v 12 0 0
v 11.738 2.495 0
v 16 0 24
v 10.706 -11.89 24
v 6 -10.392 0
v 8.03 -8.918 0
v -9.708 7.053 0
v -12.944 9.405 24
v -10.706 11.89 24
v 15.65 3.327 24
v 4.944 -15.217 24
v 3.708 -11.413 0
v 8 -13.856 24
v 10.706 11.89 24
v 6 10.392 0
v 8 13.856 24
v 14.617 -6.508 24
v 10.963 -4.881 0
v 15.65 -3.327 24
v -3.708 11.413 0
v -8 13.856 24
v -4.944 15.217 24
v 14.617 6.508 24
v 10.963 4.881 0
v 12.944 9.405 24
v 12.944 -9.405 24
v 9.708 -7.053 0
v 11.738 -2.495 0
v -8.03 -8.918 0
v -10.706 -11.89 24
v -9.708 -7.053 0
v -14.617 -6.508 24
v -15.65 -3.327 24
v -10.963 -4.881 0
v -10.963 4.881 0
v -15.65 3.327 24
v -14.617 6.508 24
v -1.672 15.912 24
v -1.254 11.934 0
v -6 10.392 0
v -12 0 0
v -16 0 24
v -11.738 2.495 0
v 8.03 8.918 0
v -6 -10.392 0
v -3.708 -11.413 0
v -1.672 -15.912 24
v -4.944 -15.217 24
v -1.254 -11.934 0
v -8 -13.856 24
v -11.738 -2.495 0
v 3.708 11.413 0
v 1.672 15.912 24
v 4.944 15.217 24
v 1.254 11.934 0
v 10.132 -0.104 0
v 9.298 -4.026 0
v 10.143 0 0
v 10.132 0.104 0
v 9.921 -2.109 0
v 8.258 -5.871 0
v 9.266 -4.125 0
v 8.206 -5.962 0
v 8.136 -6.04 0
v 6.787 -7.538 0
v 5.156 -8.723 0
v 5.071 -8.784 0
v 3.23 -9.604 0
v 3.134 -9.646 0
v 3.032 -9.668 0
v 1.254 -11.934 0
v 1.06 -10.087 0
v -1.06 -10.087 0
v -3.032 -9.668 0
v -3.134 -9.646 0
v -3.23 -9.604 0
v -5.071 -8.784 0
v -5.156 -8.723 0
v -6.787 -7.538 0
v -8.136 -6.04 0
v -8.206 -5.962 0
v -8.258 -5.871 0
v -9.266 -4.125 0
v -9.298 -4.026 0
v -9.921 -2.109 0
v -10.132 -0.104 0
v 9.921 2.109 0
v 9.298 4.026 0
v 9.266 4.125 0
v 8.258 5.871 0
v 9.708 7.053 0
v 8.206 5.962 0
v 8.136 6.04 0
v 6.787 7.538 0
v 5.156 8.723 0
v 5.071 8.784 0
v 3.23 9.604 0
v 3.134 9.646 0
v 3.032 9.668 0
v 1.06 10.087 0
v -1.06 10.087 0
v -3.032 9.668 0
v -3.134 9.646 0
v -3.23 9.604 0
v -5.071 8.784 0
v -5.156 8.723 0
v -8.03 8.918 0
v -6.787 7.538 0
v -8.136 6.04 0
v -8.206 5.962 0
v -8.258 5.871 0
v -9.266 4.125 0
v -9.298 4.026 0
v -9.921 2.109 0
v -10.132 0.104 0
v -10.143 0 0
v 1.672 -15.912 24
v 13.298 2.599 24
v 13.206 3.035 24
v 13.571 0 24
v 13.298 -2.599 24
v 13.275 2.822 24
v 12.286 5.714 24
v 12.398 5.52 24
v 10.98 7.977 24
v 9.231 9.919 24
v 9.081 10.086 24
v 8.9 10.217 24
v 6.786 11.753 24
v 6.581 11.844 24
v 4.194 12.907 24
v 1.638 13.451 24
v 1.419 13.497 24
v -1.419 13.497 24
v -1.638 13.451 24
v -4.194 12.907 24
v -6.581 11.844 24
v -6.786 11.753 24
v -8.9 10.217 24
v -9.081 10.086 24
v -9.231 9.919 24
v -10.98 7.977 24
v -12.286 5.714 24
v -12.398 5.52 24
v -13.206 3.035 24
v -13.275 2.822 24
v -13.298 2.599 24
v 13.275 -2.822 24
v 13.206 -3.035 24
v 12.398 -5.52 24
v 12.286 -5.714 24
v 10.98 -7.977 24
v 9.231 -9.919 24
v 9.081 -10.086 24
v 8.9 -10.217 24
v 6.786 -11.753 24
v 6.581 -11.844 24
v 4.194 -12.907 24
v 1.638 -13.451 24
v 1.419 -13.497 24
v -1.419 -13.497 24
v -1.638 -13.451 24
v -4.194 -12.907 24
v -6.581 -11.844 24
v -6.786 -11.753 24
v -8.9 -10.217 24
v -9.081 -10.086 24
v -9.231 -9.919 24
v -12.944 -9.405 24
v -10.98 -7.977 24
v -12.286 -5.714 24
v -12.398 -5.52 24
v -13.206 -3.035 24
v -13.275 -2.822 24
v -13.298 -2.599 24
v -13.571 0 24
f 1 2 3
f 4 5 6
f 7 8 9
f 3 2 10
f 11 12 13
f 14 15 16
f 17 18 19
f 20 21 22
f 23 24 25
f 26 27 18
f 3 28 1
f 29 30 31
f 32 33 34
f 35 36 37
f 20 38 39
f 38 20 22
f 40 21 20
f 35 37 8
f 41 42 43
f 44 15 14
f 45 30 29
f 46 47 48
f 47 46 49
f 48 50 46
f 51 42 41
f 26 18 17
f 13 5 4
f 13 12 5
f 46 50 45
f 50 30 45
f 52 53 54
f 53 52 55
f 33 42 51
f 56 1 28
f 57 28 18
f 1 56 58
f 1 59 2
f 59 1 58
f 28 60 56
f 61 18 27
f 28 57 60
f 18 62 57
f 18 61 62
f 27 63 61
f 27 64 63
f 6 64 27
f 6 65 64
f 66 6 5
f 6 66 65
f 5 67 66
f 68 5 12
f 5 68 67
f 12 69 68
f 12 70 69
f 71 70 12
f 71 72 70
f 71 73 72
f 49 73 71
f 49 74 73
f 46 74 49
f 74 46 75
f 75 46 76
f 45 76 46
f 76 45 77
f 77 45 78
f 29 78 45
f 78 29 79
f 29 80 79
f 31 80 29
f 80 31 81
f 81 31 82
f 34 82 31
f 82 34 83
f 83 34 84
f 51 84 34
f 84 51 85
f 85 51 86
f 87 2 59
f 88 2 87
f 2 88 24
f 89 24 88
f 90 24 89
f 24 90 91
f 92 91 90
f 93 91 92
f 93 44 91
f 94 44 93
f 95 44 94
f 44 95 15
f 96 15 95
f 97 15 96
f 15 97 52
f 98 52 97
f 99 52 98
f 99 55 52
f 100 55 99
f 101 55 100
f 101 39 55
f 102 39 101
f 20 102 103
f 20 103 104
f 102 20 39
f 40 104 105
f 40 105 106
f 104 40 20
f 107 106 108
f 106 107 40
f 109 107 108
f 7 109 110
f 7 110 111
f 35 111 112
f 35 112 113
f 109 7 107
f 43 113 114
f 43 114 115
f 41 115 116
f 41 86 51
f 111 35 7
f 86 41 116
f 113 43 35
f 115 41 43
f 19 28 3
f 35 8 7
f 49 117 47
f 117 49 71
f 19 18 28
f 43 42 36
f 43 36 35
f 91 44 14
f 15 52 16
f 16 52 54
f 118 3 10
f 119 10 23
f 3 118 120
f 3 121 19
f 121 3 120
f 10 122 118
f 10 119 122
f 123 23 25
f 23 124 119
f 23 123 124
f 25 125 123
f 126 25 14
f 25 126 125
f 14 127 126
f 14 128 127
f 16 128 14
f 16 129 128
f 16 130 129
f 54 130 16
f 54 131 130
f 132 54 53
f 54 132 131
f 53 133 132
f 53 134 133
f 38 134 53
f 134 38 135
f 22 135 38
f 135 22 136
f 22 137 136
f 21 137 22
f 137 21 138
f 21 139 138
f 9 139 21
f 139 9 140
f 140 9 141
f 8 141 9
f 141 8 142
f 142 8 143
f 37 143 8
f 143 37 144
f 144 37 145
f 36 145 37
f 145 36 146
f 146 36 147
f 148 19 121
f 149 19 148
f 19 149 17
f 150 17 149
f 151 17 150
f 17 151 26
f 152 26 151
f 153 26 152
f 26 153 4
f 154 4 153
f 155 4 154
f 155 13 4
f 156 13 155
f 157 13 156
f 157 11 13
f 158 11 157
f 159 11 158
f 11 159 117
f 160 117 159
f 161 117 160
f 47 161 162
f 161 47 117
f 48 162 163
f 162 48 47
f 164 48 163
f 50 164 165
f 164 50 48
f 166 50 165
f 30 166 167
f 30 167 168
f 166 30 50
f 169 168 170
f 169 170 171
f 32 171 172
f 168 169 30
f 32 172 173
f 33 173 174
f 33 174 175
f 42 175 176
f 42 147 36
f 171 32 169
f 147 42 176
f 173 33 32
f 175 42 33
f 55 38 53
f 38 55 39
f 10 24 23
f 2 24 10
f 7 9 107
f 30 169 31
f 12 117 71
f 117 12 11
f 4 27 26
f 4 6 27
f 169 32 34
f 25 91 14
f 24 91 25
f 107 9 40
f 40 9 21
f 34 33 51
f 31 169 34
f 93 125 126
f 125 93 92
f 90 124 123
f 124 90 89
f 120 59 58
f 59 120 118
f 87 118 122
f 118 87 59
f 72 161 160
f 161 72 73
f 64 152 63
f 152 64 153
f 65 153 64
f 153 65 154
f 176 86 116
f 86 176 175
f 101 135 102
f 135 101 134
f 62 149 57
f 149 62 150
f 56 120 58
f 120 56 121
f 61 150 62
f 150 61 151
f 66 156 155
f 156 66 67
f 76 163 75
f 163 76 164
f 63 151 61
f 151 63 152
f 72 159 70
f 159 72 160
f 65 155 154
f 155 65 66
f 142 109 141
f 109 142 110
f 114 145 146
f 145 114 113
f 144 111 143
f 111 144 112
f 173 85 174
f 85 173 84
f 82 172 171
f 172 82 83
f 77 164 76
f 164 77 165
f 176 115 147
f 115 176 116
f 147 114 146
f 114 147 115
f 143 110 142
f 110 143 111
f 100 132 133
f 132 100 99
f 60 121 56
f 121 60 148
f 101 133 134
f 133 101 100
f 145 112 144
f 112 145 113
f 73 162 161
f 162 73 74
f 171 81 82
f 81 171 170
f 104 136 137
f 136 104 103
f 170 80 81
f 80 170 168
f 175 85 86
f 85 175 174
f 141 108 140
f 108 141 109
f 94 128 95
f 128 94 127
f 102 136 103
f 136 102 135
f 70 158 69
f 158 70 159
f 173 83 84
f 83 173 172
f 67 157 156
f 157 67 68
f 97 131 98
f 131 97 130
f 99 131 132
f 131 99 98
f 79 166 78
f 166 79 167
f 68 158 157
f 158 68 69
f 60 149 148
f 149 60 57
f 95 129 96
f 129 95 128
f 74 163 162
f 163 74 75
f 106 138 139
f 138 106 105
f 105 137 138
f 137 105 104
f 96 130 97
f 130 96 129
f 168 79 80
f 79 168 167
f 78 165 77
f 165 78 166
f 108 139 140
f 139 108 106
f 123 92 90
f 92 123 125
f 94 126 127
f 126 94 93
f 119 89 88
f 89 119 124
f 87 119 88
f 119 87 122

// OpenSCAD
outerRadius = 16;
innerRadius = 14;
height = 24;
offset = 4;

difference() {
    cylinder(height, (outerRadius - offset), outerRadius, false);
    translate([0, 0, -1])
    cylinder((height + offset), (innerRadius - offset), innerRadius, false);
}
